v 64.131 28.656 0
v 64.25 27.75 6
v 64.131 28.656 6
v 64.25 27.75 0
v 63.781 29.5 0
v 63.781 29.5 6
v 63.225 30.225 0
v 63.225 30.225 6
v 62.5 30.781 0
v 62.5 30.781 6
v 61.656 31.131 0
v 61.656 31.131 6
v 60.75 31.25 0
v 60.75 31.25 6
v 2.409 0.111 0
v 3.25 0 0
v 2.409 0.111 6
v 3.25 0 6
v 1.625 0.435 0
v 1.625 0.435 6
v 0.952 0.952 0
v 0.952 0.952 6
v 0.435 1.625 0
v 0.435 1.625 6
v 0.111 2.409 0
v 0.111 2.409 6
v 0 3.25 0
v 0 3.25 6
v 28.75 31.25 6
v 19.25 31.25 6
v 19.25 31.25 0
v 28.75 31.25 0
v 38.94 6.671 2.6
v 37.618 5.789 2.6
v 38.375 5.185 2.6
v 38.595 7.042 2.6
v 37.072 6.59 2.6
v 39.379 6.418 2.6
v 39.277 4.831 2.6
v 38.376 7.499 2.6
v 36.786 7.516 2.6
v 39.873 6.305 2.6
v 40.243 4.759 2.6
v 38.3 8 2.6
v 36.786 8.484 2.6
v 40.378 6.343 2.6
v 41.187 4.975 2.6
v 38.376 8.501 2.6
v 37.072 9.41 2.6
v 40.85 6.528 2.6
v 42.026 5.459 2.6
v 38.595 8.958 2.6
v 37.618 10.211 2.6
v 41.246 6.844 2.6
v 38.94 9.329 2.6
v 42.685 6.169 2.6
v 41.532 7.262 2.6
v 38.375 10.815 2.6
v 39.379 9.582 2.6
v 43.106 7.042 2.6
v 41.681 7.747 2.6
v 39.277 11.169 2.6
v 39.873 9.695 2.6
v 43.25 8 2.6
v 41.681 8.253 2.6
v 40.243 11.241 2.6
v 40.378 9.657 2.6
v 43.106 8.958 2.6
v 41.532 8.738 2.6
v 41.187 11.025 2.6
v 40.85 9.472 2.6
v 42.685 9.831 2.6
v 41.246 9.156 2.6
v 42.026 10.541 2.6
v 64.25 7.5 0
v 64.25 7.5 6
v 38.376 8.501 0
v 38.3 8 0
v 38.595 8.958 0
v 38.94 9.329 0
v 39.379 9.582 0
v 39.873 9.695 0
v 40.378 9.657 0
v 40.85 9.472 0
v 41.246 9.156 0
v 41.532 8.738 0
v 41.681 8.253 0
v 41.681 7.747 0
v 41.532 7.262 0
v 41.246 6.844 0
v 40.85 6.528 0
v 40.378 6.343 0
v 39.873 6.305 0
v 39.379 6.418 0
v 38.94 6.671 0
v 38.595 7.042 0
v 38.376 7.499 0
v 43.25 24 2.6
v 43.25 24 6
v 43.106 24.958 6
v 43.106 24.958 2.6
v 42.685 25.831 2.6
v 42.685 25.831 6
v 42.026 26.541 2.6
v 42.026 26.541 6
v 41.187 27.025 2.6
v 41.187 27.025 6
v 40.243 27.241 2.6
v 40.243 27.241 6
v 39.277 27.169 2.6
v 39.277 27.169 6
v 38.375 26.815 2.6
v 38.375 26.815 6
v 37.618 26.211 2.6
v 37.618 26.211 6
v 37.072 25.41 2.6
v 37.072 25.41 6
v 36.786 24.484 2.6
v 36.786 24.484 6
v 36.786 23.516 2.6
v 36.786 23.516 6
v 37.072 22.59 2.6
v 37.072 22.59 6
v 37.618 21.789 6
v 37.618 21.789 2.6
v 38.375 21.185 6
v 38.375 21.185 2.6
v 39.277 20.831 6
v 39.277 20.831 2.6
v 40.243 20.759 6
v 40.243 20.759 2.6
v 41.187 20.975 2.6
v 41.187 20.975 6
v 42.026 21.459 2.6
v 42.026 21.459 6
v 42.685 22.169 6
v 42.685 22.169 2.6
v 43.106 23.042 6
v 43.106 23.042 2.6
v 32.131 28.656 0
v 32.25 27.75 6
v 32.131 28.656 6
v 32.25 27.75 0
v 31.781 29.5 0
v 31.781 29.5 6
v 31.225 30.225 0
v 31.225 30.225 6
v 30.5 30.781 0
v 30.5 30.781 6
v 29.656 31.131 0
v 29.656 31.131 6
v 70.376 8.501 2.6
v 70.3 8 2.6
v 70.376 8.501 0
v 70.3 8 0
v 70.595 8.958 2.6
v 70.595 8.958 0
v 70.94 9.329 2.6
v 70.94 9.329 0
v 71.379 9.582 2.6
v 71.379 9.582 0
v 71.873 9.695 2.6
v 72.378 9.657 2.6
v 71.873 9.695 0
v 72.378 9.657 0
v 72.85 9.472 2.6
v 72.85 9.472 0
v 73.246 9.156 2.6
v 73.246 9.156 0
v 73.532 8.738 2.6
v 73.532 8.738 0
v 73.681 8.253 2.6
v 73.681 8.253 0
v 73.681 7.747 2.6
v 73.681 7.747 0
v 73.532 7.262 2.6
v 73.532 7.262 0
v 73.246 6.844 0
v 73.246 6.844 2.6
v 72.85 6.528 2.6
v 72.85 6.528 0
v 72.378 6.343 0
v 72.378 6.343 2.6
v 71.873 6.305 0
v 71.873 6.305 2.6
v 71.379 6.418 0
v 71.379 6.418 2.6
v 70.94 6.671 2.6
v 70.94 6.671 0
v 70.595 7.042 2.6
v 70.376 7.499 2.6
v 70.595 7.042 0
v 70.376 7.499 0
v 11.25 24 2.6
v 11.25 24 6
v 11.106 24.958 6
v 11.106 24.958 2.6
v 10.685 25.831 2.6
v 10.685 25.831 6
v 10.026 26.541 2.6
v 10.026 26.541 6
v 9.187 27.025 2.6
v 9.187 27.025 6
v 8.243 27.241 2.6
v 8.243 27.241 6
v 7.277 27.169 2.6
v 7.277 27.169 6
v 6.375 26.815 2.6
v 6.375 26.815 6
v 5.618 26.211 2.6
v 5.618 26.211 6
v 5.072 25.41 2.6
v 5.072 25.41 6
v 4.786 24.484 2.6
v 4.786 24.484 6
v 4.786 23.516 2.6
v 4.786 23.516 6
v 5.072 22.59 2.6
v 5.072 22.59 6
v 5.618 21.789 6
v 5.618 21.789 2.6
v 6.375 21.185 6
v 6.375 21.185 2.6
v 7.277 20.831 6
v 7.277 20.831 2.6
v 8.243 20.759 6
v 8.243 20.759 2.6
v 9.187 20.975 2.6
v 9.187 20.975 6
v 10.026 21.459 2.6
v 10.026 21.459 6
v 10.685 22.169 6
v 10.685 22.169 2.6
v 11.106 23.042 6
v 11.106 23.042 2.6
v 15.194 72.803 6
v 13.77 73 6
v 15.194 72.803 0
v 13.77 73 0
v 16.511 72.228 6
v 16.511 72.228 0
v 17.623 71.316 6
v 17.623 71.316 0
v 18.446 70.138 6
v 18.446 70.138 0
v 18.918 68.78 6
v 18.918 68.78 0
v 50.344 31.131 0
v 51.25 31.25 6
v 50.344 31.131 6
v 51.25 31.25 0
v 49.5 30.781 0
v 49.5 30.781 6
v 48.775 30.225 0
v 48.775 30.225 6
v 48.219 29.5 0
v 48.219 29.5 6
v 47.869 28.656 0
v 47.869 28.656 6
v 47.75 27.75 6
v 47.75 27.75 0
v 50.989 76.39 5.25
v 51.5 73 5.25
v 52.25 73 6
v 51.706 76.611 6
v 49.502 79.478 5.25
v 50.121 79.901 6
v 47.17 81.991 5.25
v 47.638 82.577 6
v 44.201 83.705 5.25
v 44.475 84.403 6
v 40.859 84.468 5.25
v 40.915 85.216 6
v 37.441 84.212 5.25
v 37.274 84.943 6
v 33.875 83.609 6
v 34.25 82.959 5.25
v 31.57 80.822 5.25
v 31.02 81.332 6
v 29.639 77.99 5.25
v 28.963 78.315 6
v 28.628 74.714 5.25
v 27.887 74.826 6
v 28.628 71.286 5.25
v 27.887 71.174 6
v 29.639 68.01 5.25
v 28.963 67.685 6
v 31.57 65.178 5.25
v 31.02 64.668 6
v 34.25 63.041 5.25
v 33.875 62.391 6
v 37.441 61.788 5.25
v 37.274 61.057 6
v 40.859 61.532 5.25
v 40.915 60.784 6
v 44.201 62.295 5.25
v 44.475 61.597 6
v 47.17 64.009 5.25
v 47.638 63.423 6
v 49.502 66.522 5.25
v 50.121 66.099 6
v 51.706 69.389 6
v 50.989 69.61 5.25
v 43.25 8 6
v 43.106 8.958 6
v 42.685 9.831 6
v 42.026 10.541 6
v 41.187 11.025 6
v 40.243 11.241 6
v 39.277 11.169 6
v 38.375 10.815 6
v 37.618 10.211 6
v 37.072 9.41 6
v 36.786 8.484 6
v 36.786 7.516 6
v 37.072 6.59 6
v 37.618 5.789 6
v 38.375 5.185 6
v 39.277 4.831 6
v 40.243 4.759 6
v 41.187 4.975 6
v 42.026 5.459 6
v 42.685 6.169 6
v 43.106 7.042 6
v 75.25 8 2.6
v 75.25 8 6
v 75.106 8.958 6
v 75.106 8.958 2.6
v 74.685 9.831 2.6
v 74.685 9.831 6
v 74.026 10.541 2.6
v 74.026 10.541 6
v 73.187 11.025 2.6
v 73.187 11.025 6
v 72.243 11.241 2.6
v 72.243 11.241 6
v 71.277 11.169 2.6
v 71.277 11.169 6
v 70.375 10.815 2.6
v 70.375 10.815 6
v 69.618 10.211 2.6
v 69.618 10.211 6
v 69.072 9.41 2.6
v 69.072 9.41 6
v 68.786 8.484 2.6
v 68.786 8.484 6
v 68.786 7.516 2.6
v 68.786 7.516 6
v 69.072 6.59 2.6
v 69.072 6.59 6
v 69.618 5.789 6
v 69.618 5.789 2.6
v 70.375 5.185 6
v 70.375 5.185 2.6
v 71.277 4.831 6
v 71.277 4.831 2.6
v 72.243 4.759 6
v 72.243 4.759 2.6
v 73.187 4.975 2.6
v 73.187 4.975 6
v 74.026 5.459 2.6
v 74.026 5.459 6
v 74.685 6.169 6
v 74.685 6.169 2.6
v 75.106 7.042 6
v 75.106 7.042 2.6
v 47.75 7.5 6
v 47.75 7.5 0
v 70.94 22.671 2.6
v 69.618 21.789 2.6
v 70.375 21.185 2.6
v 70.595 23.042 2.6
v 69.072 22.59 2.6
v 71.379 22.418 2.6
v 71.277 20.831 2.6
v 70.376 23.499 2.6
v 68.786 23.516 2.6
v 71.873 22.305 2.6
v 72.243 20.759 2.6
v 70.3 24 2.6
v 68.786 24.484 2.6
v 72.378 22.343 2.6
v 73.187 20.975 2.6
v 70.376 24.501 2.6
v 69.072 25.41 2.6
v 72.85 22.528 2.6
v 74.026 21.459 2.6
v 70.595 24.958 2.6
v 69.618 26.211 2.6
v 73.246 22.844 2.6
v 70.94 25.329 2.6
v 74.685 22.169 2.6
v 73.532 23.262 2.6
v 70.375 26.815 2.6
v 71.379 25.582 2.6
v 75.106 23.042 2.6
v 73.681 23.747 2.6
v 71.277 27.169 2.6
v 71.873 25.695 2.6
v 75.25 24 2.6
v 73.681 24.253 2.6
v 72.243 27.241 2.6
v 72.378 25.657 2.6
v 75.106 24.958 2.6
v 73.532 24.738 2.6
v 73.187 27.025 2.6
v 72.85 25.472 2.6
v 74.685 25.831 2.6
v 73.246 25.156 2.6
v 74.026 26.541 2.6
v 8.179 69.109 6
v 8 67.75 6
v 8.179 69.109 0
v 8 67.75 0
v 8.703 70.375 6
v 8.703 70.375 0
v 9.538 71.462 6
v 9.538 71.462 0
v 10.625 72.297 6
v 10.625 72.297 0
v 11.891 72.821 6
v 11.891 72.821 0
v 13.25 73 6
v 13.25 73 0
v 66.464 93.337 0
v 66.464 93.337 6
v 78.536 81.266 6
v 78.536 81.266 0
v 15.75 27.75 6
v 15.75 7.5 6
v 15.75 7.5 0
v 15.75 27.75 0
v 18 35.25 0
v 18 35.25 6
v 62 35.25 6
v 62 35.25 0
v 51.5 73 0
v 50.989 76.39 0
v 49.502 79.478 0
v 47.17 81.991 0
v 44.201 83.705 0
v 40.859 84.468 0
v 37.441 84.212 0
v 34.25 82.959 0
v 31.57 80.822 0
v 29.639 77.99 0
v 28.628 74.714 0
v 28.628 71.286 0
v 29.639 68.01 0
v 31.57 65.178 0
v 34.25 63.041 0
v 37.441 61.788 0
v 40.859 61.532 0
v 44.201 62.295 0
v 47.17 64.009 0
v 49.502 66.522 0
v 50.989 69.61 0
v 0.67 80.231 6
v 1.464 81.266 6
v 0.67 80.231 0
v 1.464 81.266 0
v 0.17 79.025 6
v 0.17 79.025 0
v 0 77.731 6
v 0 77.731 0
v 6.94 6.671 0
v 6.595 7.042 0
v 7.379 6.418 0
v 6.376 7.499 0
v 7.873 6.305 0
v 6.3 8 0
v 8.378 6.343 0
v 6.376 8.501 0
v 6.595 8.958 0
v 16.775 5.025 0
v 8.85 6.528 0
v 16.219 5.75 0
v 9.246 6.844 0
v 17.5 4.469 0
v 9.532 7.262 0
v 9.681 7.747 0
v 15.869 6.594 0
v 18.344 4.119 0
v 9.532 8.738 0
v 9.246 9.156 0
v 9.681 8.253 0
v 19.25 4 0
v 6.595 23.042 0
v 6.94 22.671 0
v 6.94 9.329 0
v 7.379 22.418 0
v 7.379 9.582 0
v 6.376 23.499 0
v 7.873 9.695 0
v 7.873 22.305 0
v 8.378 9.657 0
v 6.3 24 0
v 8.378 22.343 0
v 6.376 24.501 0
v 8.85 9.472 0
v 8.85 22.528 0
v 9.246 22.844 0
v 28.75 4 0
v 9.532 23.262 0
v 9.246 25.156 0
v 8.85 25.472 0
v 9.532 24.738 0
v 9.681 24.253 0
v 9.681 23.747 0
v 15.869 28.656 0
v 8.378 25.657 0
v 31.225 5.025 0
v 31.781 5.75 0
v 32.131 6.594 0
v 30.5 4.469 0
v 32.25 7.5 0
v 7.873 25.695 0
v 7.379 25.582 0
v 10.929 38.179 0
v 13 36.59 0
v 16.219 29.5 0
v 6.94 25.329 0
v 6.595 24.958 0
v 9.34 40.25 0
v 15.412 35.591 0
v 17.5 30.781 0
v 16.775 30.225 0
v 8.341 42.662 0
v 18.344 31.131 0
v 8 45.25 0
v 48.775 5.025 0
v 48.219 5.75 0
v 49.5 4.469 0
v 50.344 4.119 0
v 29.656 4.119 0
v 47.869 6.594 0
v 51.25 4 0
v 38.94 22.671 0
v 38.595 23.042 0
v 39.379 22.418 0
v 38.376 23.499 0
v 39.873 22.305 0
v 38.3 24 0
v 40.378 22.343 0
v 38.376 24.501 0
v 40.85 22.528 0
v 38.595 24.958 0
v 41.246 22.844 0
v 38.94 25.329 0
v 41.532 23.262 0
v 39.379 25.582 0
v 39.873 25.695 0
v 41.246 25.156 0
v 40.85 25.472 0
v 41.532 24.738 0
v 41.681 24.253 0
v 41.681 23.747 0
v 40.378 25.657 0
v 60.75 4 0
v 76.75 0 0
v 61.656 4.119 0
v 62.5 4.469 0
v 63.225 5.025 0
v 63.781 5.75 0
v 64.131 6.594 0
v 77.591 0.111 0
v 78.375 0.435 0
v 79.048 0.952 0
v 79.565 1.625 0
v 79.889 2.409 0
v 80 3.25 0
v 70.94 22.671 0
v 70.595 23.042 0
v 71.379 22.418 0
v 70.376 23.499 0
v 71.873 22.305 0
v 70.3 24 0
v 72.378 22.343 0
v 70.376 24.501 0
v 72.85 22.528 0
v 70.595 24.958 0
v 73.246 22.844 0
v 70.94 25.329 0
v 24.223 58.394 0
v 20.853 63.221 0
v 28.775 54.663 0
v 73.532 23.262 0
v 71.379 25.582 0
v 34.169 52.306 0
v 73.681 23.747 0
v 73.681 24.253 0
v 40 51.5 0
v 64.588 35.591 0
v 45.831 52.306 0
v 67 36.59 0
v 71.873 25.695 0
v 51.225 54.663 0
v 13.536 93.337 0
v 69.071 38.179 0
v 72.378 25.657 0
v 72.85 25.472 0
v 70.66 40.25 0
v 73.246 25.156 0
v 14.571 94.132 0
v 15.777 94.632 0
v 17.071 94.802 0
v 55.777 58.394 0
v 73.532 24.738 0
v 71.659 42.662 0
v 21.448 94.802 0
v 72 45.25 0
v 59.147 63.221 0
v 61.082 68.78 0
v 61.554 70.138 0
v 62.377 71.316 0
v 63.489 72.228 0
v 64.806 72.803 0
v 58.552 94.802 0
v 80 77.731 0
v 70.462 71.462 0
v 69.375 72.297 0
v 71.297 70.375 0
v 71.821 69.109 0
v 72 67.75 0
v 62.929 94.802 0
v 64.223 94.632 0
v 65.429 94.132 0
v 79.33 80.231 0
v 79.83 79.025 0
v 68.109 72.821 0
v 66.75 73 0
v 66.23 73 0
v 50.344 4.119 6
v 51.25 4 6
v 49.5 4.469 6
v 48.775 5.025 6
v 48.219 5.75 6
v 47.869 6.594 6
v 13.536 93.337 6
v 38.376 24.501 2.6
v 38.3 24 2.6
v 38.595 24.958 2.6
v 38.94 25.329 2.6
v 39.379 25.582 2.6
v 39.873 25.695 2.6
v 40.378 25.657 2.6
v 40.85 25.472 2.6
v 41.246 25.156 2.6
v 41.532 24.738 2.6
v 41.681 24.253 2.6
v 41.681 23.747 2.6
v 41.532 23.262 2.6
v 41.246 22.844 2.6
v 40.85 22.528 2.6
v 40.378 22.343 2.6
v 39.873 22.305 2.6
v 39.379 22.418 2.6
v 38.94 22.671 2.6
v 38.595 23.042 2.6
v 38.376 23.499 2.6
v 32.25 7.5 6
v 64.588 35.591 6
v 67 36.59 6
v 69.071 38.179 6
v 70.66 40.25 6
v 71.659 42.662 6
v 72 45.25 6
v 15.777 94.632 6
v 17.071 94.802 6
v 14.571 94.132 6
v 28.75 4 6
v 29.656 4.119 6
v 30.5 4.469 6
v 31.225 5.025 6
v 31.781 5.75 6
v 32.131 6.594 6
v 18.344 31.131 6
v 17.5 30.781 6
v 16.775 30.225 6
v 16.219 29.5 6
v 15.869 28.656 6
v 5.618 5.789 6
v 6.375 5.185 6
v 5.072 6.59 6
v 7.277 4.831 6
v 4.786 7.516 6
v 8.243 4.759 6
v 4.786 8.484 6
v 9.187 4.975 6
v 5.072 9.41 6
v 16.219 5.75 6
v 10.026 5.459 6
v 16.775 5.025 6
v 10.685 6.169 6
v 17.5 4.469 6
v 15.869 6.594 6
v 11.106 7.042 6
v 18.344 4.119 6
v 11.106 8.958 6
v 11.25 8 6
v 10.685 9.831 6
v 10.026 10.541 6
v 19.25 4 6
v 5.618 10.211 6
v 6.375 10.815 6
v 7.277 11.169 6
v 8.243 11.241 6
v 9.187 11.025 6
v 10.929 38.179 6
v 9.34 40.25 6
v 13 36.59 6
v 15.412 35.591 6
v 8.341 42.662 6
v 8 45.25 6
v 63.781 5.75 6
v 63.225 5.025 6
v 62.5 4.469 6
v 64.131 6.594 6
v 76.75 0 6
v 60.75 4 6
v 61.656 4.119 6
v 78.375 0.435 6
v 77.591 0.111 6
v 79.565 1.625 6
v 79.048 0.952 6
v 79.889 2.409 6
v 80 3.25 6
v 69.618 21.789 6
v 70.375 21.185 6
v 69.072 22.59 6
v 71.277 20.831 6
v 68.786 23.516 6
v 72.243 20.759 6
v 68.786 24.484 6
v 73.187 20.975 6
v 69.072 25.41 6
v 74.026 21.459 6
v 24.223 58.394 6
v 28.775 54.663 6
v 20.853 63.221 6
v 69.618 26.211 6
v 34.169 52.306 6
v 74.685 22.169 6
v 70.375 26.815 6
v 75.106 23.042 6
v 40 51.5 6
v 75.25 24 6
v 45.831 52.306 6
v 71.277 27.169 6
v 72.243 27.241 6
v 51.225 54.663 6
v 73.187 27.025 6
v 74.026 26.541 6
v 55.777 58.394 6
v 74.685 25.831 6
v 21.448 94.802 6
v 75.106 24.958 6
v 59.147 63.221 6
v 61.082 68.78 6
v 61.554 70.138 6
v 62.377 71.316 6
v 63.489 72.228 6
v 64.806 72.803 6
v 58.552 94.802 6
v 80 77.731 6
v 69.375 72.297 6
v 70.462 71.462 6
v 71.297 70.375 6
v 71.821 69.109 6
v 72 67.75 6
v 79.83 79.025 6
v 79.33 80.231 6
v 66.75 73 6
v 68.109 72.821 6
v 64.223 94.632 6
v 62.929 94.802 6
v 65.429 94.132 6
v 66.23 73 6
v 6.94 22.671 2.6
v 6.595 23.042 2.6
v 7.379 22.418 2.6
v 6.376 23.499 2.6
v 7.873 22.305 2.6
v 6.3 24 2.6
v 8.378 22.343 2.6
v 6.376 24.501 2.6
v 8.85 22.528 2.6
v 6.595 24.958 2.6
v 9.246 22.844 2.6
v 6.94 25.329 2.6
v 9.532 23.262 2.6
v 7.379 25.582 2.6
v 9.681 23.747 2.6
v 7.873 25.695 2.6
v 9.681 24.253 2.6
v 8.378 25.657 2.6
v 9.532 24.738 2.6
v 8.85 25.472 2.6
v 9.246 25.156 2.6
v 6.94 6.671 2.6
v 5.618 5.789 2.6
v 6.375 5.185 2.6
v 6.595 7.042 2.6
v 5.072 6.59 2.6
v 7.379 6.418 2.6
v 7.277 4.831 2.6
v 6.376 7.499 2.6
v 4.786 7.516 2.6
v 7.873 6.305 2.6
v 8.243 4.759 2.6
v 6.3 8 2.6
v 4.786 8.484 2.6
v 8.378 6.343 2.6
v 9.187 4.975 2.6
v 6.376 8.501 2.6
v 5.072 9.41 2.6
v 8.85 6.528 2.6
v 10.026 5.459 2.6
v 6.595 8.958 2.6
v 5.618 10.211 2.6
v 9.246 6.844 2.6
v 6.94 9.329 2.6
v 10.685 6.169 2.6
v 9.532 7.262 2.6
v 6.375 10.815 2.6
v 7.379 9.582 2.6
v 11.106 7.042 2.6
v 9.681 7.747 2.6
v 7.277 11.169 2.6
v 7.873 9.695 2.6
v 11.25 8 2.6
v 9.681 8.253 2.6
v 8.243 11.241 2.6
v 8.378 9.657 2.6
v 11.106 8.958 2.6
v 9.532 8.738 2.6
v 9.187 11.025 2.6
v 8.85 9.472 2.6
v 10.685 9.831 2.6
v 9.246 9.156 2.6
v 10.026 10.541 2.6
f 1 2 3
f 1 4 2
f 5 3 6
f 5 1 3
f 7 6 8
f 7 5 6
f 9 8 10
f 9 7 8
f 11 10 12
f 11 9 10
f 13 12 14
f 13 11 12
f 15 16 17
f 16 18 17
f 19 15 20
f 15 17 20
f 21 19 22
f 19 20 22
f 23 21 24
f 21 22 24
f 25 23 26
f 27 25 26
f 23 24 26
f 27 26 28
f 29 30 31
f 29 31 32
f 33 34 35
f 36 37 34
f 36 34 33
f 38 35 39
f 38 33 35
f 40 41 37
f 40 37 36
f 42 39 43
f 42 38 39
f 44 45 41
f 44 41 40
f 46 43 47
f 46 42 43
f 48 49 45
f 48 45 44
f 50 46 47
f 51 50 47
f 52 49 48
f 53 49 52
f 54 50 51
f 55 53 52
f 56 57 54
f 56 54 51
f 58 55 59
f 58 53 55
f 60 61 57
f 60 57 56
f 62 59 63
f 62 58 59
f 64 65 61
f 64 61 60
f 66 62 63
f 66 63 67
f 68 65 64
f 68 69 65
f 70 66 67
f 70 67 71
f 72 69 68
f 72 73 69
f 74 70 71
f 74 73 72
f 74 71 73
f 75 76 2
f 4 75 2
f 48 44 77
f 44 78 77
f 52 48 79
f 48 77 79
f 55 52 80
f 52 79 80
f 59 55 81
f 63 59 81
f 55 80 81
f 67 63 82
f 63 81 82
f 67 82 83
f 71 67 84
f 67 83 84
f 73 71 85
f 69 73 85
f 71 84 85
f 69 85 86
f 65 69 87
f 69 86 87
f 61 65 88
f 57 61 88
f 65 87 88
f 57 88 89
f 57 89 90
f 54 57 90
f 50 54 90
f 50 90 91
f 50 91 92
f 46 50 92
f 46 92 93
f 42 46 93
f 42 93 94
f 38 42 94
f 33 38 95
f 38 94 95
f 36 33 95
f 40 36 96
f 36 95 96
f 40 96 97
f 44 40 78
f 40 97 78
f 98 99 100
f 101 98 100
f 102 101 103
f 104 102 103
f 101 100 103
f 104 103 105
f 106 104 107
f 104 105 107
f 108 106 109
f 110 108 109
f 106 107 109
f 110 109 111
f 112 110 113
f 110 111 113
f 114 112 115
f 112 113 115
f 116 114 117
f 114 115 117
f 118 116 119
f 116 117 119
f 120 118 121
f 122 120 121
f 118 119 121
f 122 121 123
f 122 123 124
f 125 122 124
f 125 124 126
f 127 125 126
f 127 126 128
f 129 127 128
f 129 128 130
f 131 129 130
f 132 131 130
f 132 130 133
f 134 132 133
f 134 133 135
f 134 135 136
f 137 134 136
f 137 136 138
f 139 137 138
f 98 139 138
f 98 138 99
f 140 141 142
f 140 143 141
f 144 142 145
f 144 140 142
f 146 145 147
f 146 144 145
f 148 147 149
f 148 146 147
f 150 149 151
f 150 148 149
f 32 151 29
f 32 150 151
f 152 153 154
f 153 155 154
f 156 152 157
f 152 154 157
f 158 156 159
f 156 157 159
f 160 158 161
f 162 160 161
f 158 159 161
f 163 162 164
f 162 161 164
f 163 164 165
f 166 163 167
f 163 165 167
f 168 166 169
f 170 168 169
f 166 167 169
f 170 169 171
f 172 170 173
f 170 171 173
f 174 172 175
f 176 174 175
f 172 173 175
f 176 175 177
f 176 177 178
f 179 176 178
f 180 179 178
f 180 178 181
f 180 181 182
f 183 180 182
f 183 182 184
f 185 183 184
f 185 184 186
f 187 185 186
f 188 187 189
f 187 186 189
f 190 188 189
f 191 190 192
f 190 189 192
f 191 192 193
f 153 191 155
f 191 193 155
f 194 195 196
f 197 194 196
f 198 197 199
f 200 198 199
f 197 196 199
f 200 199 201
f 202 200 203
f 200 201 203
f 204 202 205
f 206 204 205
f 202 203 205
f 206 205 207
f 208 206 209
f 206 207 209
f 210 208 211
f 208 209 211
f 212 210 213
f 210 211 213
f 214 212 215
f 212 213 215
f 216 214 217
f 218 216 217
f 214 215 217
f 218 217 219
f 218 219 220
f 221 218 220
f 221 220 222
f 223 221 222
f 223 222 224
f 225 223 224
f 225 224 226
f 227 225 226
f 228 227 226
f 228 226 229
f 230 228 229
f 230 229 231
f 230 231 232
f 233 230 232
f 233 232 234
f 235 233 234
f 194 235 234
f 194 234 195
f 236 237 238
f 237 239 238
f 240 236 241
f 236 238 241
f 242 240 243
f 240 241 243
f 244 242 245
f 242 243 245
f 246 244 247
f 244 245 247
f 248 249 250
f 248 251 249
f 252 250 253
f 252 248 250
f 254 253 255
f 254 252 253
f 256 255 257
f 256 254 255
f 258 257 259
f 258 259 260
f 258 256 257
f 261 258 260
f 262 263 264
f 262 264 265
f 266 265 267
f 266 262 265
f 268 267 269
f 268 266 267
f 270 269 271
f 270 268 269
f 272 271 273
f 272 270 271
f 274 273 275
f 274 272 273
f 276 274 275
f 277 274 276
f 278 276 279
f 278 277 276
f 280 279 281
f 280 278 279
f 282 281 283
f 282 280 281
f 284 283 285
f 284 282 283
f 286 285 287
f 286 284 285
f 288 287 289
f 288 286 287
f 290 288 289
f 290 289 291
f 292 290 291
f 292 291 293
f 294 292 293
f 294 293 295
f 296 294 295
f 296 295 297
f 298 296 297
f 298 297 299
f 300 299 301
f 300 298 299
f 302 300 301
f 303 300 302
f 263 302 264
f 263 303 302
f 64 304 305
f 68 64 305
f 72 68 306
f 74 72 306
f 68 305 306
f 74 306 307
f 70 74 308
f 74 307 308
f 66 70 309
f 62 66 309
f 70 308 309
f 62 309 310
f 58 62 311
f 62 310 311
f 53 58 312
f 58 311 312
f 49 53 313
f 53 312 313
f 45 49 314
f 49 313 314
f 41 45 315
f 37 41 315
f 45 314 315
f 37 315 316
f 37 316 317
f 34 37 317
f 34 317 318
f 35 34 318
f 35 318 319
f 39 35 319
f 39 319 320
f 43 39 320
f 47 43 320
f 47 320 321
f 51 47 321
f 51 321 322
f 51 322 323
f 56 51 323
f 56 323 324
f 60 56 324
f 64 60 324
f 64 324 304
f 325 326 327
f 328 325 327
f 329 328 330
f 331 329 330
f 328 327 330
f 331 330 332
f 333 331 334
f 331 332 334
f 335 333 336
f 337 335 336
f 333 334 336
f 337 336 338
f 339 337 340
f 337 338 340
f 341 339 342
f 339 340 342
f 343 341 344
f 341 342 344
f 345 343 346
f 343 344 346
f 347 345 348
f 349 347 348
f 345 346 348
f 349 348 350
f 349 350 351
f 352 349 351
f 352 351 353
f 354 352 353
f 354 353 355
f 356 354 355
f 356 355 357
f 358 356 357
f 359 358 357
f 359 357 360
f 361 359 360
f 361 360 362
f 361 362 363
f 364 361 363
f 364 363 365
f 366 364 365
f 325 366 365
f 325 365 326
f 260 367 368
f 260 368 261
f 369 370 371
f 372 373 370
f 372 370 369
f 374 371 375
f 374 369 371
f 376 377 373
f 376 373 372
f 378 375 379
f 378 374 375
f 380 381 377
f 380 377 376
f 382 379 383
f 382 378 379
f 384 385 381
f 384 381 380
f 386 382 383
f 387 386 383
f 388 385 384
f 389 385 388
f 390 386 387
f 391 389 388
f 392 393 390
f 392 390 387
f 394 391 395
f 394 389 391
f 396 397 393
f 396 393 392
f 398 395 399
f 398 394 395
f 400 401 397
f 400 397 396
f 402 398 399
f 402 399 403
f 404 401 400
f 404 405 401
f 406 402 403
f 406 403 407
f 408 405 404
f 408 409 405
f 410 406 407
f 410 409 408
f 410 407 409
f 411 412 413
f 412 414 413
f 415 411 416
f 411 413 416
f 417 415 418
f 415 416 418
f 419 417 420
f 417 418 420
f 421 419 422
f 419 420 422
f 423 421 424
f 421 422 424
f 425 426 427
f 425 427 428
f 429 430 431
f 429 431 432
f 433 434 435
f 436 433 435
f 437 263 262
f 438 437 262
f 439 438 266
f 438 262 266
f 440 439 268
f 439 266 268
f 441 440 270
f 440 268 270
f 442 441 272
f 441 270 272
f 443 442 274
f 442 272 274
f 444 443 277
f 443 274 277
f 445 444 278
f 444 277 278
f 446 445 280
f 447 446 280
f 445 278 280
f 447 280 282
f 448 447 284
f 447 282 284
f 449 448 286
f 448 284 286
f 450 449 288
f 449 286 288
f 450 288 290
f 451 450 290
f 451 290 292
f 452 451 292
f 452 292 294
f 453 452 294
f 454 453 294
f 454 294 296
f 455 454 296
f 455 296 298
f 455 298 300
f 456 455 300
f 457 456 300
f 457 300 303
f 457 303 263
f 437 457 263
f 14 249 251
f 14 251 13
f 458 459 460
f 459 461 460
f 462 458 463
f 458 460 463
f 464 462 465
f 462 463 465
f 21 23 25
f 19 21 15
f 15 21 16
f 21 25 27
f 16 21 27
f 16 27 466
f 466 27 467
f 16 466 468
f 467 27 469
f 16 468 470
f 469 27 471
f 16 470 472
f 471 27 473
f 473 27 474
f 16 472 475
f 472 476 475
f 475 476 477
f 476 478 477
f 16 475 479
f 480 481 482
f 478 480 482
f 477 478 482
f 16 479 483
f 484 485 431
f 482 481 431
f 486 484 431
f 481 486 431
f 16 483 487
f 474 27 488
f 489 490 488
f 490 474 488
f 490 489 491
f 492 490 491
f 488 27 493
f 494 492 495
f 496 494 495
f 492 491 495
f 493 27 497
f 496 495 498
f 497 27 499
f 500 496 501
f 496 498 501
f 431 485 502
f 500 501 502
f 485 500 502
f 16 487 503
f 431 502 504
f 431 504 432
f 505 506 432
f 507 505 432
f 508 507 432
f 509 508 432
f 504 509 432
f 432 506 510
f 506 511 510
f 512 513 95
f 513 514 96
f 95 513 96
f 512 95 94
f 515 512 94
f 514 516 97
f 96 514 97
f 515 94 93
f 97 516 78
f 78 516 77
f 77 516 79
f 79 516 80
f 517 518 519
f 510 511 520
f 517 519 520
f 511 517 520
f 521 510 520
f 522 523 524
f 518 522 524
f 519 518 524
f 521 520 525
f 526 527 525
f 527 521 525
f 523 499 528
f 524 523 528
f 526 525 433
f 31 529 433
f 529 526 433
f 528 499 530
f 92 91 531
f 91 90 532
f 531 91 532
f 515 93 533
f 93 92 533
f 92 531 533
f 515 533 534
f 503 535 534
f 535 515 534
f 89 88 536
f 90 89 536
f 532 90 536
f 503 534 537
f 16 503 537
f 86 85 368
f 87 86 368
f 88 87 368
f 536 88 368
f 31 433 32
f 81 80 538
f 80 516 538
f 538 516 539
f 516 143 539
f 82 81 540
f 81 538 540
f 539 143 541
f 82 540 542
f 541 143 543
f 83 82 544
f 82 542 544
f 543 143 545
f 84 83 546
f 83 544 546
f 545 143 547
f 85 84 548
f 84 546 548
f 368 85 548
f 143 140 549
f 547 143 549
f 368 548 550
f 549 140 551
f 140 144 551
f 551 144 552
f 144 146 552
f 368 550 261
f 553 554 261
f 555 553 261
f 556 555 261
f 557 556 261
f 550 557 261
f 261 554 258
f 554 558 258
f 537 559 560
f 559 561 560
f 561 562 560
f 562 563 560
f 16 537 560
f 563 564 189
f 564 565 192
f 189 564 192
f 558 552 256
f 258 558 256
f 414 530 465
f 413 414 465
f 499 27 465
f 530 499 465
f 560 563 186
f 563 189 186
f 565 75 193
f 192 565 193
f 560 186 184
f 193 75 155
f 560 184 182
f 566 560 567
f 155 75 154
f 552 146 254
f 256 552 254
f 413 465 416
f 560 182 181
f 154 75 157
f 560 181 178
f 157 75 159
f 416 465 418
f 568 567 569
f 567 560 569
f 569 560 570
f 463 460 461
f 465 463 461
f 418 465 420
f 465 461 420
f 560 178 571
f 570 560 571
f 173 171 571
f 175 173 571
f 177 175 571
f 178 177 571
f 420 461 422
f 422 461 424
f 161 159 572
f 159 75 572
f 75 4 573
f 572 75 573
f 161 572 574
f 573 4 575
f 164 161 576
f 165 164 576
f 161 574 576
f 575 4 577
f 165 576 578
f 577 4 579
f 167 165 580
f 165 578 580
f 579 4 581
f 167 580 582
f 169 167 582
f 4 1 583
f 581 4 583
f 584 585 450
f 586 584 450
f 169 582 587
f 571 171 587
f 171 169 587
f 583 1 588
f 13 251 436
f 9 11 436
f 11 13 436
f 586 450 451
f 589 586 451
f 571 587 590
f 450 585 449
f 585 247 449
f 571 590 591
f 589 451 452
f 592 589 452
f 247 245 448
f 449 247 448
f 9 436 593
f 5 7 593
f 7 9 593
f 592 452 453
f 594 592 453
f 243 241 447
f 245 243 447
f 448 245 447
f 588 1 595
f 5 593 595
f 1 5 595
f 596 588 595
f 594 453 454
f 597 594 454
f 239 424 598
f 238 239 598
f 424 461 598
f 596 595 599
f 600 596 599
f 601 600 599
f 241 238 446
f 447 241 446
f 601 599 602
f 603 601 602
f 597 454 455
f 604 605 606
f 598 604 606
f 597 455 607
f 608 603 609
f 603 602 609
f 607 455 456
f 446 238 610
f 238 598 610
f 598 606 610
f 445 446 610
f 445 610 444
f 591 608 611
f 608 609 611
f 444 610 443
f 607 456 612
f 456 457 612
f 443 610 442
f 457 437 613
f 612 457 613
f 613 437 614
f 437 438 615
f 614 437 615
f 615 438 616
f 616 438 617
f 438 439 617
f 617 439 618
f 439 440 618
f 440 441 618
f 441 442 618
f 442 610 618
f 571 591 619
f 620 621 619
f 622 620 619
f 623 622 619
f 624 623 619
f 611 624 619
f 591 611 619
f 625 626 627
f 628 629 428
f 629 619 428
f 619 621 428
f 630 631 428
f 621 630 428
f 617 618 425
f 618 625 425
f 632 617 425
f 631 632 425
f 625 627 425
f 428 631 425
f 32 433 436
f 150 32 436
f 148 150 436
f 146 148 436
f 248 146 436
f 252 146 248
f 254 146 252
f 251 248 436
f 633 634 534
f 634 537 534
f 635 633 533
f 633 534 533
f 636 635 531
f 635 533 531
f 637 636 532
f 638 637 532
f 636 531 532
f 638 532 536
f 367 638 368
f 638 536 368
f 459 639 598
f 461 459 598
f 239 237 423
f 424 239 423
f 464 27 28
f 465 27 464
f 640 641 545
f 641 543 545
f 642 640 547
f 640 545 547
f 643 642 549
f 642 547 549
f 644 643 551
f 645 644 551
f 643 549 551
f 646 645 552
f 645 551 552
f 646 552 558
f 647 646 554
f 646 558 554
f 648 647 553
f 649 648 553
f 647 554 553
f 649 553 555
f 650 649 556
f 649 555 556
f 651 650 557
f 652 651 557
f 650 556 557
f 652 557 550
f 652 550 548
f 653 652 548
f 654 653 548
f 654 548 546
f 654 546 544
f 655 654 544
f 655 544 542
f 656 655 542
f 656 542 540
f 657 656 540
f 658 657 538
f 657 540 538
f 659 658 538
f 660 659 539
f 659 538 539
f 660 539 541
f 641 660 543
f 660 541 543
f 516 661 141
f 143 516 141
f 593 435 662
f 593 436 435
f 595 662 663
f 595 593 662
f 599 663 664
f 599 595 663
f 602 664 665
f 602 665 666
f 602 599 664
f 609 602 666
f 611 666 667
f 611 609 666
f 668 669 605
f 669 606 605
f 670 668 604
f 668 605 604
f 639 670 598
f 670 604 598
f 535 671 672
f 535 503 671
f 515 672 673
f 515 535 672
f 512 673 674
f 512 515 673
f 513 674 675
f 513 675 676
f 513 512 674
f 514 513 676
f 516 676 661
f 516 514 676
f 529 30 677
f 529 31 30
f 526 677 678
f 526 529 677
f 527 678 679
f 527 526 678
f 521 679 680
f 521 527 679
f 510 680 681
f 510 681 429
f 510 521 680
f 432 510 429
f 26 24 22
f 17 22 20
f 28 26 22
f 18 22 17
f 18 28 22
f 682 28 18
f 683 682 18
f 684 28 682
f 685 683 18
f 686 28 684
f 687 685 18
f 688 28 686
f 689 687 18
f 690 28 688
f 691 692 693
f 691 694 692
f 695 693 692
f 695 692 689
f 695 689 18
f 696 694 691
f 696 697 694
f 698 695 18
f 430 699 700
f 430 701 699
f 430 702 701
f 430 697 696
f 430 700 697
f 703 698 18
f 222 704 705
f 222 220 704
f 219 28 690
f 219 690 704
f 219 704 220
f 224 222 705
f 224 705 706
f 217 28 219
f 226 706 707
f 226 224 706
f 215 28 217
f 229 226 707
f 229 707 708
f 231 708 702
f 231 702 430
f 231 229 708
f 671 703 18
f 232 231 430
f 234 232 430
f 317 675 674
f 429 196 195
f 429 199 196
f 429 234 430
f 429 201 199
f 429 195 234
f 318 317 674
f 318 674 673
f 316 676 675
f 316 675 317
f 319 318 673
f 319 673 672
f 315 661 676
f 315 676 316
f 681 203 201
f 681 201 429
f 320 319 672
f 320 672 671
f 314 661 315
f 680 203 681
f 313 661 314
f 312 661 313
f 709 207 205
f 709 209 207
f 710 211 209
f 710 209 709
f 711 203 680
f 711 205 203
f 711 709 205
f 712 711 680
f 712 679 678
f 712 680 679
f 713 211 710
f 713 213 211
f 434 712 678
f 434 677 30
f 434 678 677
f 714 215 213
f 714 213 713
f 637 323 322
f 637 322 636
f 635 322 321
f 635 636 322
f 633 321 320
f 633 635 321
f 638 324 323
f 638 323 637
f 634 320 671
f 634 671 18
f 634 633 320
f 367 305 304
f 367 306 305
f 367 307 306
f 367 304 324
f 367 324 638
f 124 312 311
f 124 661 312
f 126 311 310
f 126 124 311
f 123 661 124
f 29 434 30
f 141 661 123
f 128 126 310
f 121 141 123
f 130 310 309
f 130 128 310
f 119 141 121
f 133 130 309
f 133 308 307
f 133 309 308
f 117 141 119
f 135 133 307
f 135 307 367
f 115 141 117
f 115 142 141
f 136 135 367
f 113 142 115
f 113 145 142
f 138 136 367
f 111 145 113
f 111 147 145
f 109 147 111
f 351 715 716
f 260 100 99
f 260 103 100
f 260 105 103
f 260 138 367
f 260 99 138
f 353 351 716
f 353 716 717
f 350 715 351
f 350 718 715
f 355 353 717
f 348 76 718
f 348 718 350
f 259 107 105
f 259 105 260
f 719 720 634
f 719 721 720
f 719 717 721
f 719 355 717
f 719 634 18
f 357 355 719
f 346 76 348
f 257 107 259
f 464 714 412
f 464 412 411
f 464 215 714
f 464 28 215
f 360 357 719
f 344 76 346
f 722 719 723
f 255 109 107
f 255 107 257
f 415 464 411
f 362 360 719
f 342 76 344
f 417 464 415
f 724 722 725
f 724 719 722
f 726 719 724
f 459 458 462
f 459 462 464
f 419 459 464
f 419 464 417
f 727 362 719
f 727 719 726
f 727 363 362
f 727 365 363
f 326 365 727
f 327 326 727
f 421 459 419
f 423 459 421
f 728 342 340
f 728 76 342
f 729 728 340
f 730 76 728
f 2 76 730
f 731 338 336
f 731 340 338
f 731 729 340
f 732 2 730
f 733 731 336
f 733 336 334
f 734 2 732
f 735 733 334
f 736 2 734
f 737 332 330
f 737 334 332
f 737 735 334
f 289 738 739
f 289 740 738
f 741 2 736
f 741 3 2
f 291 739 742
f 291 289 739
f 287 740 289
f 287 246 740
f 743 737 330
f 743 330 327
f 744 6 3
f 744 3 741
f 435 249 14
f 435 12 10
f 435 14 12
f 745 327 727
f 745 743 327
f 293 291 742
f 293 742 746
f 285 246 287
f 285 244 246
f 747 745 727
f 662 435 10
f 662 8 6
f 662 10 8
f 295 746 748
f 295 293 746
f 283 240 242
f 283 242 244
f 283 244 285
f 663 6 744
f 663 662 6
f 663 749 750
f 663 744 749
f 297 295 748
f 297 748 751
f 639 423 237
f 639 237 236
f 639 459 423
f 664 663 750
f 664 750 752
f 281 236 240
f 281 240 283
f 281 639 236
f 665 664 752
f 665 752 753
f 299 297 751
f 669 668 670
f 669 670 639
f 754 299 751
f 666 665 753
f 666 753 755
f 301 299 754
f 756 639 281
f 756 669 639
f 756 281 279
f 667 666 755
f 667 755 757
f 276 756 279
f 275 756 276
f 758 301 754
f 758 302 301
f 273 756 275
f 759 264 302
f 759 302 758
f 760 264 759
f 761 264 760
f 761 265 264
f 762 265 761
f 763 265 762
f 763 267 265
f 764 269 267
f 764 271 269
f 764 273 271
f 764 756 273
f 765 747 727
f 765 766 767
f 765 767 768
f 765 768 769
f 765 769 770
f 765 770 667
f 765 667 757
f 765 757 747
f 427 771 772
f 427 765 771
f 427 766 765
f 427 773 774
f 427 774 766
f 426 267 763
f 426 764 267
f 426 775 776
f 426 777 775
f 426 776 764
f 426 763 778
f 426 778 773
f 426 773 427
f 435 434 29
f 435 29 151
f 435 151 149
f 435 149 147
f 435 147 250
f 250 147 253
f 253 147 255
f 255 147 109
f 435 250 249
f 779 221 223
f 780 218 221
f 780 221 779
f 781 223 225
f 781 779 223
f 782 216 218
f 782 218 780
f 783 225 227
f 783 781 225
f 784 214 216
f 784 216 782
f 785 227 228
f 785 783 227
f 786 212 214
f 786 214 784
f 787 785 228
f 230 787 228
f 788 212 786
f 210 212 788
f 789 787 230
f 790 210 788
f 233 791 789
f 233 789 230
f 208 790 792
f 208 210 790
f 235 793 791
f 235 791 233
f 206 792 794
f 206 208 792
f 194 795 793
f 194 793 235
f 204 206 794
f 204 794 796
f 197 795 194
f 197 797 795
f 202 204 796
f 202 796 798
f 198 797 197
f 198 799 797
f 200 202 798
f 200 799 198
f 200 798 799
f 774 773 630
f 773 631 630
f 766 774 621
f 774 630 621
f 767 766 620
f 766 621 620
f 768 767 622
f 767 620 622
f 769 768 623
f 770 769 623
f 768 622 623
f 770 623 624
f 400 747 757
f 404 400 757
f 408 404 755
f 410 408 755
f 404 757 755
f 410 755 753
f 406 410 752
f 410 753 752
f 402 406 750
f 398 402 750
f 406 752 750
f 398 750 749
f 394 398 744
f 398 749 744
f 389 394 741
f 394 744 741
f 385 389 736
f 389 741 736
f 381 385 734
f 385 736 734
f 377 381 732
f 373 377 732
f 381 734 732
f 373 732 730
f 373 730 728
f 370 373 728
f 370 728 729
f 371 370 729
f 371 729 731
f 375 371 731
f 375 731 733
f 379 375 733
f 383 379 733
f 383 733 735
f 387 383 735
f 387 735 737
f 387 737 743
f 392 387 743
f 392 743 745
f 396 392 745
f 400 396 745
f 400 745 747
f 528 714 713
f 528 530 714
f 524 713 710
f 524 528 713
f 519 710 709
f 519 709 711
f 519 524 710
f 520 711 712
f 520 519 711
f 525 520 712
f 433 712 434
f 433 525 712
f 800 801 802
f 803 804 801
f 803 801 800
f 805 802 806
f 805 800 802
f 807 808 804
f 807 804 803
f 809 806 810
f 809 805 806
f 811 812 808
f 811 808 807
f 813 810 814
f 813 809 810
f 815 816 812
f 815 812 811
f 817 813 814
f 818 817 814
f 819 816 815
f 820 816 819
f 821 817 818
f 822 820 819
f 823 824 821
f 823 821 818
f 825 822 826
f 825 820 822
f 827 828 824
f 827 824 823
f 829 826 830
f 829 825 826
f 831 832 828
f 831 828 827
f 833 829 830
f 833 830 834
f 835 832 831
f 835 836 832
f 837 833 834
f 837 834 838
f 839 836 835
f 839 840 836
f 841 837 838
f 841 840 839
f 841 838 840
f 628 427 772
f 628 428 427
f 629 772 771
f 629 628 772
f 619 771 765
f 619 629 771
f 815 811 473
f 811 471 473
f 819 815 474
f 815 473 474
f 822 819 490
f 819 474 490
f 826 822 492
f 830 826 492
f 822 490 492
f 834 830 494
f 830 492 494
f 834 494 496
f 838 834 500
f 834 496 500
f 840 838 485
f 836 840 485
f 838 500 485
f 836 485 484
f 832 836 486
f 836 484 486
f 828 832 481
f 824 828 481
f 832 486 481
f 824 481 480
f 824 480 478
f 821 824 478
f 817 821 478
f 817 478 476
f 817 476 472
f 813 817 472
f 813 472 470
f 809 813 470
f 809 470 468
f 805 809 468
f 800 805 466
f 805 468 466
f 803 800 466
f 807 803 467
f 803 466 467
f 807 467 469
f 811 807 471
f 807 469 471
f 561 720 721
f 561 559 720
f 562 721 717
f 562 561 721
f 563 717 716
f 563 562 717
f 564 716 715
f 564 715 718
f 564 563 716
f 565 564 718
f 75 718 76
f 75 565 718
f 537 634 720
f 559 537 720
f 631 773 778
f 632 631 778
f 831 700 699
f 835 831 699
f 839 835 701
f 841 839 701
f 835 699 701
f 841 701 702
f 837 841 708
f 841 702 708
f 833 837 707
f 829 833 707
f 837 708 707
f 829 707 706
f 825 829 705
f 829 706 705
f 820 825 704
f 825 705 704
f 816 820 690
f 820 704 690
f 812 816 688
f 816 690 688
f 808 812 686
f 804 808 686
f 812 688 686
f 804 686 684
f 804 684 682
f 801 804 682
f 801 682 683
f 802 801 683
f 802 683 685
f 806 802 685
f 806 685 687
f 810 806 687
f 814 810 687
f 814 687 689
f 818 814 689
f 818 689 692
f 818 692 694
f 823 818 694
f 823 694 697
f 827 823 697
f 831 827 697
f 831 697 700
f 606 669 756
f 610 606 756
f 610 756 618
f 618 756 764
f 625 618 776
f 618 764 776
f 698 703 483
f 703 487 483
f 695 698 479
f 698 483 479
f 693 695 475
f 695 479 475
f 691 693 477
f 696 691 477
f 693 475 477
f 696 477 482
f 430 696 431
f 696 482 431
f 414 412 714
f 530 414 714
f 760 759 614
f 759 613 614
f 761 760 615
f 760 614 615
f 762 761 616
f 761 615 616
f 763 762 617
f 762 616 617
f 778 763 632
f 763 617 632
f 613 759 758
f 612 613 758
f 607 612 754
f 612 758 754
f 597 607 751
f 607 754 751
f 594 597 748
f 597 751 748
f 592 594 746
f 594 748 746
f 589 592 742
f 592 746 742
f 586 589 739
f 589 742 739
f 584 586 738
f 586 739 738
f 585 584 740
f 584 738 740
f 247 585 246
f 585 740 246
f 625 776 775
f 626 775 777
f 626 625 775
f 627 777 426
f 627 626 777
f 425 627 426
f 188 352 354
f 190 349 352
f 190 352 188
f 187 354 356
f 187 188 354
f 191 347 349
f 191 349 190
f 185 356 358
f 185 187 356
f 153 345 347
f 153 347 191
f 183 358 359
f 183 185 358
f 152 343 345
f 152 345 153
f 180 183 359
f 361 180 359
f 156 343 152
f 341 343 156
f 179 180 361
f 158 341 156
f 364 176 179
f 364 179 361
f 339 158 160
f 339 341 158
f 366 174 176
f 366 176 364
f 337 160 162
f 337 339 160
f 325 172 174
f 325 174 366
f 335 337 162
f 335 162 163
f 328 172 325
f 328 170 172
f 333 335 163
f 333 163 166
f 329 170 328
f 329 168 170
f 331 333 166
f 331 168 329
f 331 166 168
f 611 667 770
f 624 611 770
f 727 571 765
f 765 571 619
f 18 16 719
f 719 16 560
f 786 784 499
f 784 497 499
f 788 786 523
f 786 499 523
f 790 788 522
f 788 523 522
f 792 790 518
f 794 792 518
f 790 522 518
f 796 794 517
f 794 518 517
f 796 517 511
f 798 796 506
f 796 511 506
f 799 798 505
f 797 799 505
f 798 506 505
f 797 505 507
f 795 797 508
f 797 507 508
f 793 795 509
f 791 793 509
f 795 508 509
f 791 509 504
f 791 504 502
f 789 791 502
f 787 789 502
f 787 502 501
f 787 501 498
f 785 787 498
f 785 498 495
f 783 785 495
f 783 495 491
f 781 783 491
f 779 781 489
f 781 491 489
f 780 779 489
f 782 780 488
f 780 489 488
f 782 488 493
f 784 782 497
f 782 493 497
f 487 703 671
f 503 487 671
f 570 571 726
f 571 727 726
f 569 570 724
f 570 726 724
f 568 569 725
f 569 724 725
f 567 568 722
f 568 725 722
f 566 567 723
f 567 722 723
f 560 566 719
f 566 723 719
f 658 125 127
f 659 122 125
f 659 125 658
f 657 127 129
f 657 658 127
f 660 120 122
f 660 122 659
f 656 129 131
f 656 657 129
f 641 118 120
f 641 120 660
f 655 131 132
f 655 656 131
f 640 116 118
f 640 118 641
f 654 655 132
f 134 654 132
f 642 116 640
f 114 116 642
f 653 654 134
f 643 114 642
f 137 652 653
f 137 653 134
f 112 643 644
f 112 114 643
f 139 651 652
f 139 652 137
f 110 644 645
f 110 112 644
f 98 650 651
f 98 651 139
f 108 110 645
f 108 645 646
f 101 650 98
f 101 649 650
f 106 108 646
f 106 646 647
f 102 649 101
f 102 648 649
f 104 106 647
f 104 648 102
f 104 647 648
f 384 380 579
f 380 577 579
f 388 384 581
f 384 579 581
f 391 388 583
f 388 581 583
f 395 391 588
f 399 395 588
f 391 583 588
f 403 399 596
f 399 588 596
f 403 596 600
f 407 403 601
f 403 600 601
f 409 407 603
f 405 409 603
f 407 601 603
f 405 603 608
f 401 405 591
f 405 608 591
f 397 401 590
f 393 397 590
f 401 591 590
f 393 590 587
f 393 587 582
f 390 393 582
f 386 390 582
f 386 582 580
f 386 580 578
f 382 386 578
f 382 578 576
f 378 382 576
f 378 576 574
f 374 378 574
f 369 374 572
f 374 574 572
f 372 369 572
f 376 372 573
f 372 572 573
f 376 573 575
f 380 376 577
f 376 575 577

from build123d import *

# Parameters (mm, degrees)
SKETCH1_W                                           = 80
SKETCH1_H                                           = 115
BOSS_EXTRUDE1_DEPTH                                 = 6
CBORE_FOR_M3_HEX_SOCKET_HEAD_CAP_SCREW1_D           = 3.4
CBORE_FOR_M3_HEX_SOCKET_HEAD_CAP_SCREW1_CBORE_D     = 6.5
CBORE_FOR_M3_HEX_SOCKET_HEAD_CAP_SCREW1_CBORE_DEPTH = 3.4
SKETCH4_R                                           = 11.5
CUT_EXTRUDE1_DEPTH                                  = 141.2176879
CHAMFER1_SIZE                                       = 0.75
CHAMFER2_SIZE                                       = 6
CBORE_START                                         = 2.6
CBORE_FOR_M3_HEX_SOCKET_HEAD_CAP_SCR_2_R            = 3.25
CBORE_FOR_M3_HEX_SOCKET_HEAD_CAP_SCREW2_DEPTH       = 3.4
CBORE_FOR_M3_HEX_SOCKET_HEAD_CAP_SCR_3_O_R          = 1.7
CBORE_FOR_M3_HEX_SOCKET_HEAD_CAP_SCR_3_DEPTH        = 2.6
CUT_EXTRUDE2_DEPTH                                  = 141.2176879
FILLET1_R                                           = 3.25
CUT_EXTRUDE3_DEPTH                                  = 141.2176879
FILLET2_R                                           = 10
FILLET4_R                                           = 5.25
SKETCH10_W                                          = 16.5
SKETCH10_H                                          = 27.25
CUT_EXTRUDE4_DEPTH                                  = 141.2176879
FILLET5_R                                           = 3.5
SKETCH11_W                                          = 80
SKETCH11_H                                          = 20.198039027
CUT_EXTRUDE5_DEPTH                                  = 141.2176879
CHAMFER3_SIZE                                       = 15
FILLET6_R                                           = 5


# Read off the part's stored shape, not the designer's step: CBORE for M3 Hex Socket Head Cap Screw2
with BuildPart() as part:
    # Sketch1 → Boss-Extrude1 (new body)
    with BuildSketch(Plane.XY):
        with Locations((40, 57.5)):
            Rectangle(SKETCH1_W, SKETCH1_H)
    extrude(amount=BOSS_EXTRUDE1_DEPTH)

    # CBORE for M3 Hex Socket Head Cap Screw1 (through all)
    with Locations(Plane.XY.offset(6)):
        with Locations((8, 8), (40, 8), (72, 8), (40, 24), (72, 24), (8, 24)):
            CounterBoreHole(CBORE_FOR_M3_HEX_SOCKET_HEAD_CAP_SCREW1_D / 2, CBORE_FOR_M3_HEX_SOCKET_HEAD_CAP_SCREW1_CBORE_D / 2, CBORE_FOR_M3_HEX_SOCKET_HEAD_CAP_SCREW1_CBORE_DEPTH)

    # Sketch4 → Cut-Extrude1 (cut, through all)
    with BuildSketch(Plane.XY.offset(6)):
        with Locations((40, 73)):
            Circle(SKETCH4_R)
    extrude(amount=-CUT_EXTRUDE1_DEPTH, mode=Mode.SUBTRACT)

    # Chamfer1
    chamfer1_edges = [part.edges().sort_by_distance(p)[0] for p in [
        (28.5, 73, 6),
    ]]
    chamfer(chamfer1_edges, length=CHAMFER1_SIZE)

    # Chamfer2
    chamfer2_edges = [part.edges().sort_by_distance(p)[0] for p in [
        (0, 115, 3),
        (80, 115, 3),
    ]]
    chamfer(chamfer2_edges, length=CHAMFER2_SIZE)

    # CBORE for M3 Hex Socket Head Cap Scr 2 → CBORE for M3 Hex Socket Head Cap Screw2 (cut)
    with BuildSketch(Plane.XY.offset(CBORE_START)):
        with Locations((8, 105)):
            Circle(CBORE_FOR_M3_HEX_SOCKET_HEAD_CAP_SCR_2_R)
        with Locations((72, 105)):
            Circle(CBORE_FOR_M3_HEX_SOCKET_HEAD_CAP_SCR_2_R)
    extrude(amount=CBORE_FOR_M3_HEX_SOCKET_HEAD_CAP_SCREW2_DEPTH, mode=Mode.SUBTRACT)

    # CBORE for M3 Hex Socket Head Cap Scr 3 o → CBORE for M3 Hex Socket Head Cap Scr 3 (cut)
    with BuildSketch(Plane.XY):
        with Locations((8, 105)):
            Circle(CBORE_FOR_M3_HEX_SOCKET_HEAD_CAP_SCR_3_O_R)
        with Locations((72, 105)):
            Circle(CBORE_FOR_M3_HEX_SOCKET_HEAD_CAP_SCR_3_O_R)
    extrude(amount=CBORE_FOR_M3_HEX_SOCKET_HEAD_CAP_SCR_3_DEPTH, mode=Mode.SUBTRACT)

    # Sketch8 → Cut-Extrude2 (cut, through all)
    with BuildSketch(Plane.XY.offset(6)):
        Polygon((18.198039027, 105), (18.198039027, 94.801960973), (40, 94.801960973), (61.801960973, 94.801960973), (61.801960973, 105), (61.801960973, 115), (18.198039027, 115), align=None)
    extrude(amount=-CUT_EXTRUDE2_DEPTH, mode=Mode.SUBTRACT)

    # Fillet1
    fillet1_edges = [part.edges().sort_by_distance(p)[0] for p in [
        (61.801960973, 115, 3),
        (61.801960973, 94.801960973, 3),
        (18.198039027, 94.801960973, 3),
        (18.198039027, 115, 3),
        (0, 109, 3),
        (74, 115, 3),
        (6, 115, 3),
        (80, 109, 3),
        (80, 0, 3),
        (0, 0, 3),
    ]]
    fillet(fillet1_edges, radius=FILLET1_R)

    # Sketch9 → Cut-Extrude3 (cut, through all)
    with BuildSketch(Plane.XY.offset(6)):
        with BuildLine():
            Line((8, 73), (8, 35.25))
            Line((8, 35.25), (40, 35.25))
            Line((40, 35.25), (72, 35.25))
            Line((72, 35.25), (72, 73))
            Line((72, 73), (61.5, 73))
            ThreePointArc((61.5, 73), (40, 51.5), (18.5, 73))
            Line((18.5, 73), (8, 73))
        make_face()
    extrude(amount=-CUT_EXTRUDE3_DEPTH, mode=Mode.SUBTRACT)

    # Fillet2
    fillet2_edges = [part.edges().sort_by_distance(p)[0] for p in [
        (72, 35.25, 3),
        (8, 35.25, 3),
    ]]
    fillet(fillet2_edges, radius=FILLET2_R)

    # Fillet4
    fillet4_edges = [part.edges().sort_by_distance(p)[0] for p in [
        (18.5, 73, 3),
        (61.5, 73, 3),
        (72, 73, 3),
        (8, 73, 3),
    ]]
    fillet(fillet4_edges, radius=FILLET4_R)

    # Sketch10 → Cut-Extrude4 (cut, through all)
    with BuildSketch(Plane.XY.offset(6)):
        with Locations((24, 17.625)):
            Rectangle(SKETCH10_W, SKETCH10_H)
        with Locations((56, 17.625)):
            Rectangle(SKETCH10_W, SKETCH10_H)
    extrude(amount=-CUT_EXTRUDE4_DEPTH, mode=Mode.SUBTRACT)

    # Fillet5
    fillet5_edges = [part.edges().sort_by_distance(p)[0] for p in [
        (15.75, 31.25, 3),
        (32.25, 31.25, 3),
        (32.25, 4, 3),
        (15.75, 4, 3),
        (47.75, 31.25, 3),
        (64.25, 31.25, 3),
        (64.25, 4, 3),
        (47.75, 4, 3),
    ]]
    fillet(fillet5_edges, radius=FILLET5_R)

    # Sketch11 → Cut-Extrude5 (cut, through all)
    with BuildSketch(Plane.XY.offset(6)):
        with Locations((40, 104.900980487)):
            Rectangle(SKETCH11_W, SKETCH11_H)
    extrude(amount=-CUT_EXTRUDE5_DEPTH, mode=Mode.SUBTRACT)

    # Chamfer3
    chamfer3_edges = [part.edges().sort_by_distance(p)[0] for p in [
        (80, 94.801960973, 3),
        (0, 94.801960973, 3),
    ]]
    chamfer(chamfer3_edges, length=CHAMFER3_SIZE)

    # Fillet6
    fillet6_edges = [part.edges().sort_by_distance(p)[0] for p in [
        (80, 79.801960973, 3),
        (15, 94.801960973, 3),
        (65, 94.801960973, 3),
        (0, 79.801960973, 3),
    ]]
    fillet(fillet6_edges, radius=FILLET6_R)


solid = part.part
